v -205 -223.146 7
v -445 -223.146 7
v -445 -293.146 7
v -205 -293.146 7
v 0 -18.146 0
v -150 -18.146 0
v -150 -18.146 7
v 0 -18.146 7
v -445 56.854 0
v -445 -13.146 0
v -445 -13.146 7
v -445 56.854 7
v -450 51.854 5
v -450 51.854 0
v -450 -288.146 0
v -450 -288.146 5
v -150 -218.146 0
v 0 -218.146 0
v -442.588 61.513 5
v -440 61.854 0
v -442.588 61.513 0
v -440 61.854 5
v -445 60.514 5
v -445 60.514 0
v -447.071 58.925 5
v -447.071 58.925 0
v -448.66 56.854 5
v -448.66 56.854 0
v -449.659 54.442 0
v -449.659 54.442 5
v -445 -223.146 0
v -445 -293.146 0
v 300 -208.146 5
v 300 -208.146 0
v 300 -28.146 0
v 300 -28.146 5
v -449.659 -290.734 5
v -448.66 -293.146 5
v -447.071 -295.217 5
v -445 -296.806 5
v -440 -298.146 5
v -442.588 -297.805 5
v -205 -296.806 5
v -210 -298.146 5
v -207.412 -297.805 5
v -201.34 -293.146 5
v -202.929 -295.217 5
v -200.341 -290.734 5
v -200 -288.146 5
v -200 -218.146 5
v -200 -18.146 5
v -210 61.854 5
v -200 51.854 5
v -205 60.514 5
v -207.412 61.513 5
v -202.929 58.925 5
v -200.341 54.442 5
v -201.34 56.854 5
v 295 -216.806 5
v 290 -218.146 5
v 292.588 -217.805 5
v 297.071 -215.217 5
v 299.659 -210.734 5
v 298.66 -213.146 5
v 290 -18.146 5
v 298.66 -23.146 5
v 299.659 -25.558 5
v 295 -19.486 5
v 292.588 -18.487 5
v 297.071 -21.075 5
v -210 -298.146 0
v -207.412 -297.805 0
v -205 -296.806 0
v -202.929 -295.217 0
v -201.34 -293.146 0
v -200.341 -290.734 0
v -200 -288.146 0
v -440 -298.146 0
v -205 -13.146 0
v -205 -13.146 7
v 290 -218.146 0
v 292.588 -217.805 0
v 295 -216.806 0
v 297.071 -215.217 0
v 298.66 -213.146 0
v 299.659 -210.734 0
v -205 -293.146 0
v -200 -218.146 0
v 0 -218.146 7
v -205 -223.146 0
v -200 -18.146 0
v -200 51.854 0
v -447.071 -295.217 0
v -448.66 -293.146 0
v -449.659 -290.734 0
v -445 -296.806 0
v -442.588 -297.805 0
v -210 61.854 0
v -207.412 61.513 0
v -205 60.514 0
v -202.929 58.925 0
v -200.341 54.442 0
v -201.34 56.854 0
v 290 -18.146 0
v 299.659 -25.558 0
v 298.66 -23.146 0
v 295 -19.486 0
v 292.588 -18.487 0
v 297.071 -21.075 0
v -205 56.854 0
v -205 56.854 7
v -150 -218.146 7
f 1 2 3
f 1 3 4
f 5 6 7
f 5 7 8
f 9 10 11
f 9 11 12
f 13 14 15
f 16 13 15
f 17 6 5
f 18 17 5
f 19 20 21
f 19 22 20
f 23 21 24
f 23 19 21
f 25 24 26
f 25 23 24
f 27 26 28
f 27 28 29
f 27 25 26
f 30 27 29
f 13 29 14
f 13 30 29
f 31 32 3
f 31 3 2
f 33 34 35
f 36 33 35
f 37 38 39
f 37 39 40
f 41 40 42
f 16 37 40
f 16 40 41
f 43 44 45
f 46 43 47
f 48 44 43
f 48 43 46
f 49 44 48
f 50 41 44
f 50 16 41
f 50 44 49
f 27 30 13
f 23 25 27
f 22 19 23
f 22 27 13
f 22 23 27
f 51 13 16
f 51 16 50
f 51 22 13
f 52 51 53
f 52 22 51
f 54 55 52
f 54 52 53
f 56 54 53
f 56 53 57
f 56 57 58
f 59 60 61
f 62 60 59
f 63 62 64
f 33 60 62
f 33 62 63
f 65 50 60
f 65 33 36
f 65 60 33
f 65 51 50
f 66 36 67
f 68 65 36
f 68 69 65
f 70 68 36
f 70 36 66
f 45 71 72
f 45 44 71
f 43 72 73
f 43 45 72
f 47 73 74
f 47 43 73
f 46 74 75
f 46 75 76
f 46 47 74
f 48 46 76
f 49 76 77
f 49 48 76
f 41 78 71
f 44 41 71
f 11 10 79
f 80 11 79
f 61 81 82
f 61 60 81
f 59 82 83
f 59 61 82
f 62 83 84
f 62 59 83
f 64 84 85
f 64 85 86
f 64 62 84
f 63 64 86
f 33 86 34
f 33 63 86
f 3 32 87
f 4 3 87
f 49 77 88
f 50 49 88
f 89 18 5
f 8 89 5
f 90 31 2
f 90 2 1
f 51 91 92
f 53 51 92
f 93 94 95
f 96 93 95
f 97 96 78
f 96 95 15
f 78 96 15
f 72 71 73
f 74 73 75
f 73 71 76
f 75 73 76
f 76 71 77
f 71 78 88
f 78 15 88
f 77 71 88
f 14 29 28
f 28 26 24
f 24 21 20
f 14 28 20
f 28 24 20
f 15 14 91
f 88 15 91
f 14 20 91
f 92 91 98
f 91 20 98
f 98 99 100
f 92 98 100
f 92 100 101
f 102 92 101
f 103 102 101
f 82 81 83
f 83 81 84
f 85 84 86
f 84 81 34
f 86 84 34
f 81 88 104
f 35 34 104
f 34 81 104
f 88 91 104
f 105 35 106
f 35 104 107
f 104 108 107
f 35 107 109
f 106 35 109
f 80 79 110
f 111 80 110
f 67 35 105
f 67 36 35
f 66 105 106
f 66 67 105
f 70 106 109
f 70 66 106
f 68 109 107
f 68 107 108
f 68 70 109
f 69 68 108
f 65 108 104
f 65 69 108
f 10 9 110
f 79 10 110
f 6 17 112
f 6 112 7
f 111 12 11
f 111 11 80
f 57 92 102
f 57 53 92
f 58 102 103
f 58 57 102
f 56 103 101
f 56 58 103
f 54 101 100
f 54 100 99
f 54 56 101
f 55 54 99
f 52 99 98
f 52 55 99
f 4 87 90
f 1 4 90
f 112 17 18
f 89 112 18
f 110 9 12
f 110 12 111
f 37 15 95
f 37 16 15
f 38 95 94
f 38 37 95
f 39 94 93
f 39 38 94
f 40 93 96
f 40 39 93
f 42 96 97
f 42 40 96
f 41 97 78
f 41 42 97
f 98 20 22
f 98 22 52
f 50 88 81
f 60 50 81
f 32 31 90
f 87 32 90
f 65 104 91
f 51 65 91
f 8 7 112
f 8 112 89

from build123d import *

# Parameters (mm, degrees)
F0_W     = 300
F0_H     = 200
F0_W_2   = 150
F0_W_3   = 250
F0_H_2   = 80
F0_W_4   = 240
F0_H_3   = 70
F1_DEPTH = 5
F2_DEPTH = 7
F3_R     = 10


with BuildPart() as f1:
    # F0 (on Top) → F1 (new body)
    with BuildSketch(Plane.XY):
        Polygon((-200, -18.1460690498), (-450, -18.1460690498), (-450, -218.1460690498), (-200, -218.1460690498), (-150, -218.1460690498), (-150, -18.1460690498), align=None)
        with Locations((150, -118.1460690498)):
            Rectangle(F0_W, F0_H)
        with Locations((-75, -118.1460690498)):
            Rectangle(F0_W_2, F0_H)
        with Locations((-325, 21.8539309502)):
            Rectangle(F0_W_3, F0_H_2)
        with Locations((-325, 21.8539309502)):
            Rectangle(F0_W_4, F0_H_3, mode=Mode.SUBTRACT)
        with Locations((-325, -258.1460690498)):
            Rectangle(F0_W_3, F0_H_2)
        with Locations((-325, -258.1460690498)):
            Rectangle(F0_W_4, F0_H_3, mode=Mode.SUBTRACT)
        with Locations((-325, 21.8539309502)):
            Rectangle(F0_W_4, F0_H_3)
        with Locations((-325, -258.1460690498)):
            Rectangle(F0_W_4, F0_H_3)
    extrude(amount=F1_DEPTH)

    # F3
    f3_edges = [f1.edges().sort_by_distance(p)[0] for p in [
        (300, -218.146069, 2.5),
        (300, -18.146069, 2.5),
        (-200, -298.146069, 2.5),
        (-450, -298.146069, 2.5),
        (-450, 61.853931, 2.5),
        (-200, 61.853931, 2.5),
    ]]
    fillet(f3_edges, radius=F3_R)


with BuildPart() as f2:
    # F0 (on Top) → F2 (new body)
    with BuildSketch(Plane.XY):
        with Locations((-325, -258.1460690498)):
            Rectangle(F0_W_4, F0_H_3)
    extrude(amount=F2_DEPTH)


with BuildPart() as f2b:
    # F0 (on Top) → F2, piece 2 (new body)
    with BuildSketch(Plane.XY):
        with Locations((-325, 21.8539309502)):
            Rectangle(F0_W_4, F0_H_3)
    extrude(amount=F2_DEPTH)


with BuildPart() as f2c:
    # F0 (on Top) → F2, piece 3 (new body)
    with BuildSketch(Plane.XY):
        with Locations((-75, -118.1460690498)):
            Rectangle(F0_W_2, F0_H)
    extrude(amount=F2_DEPTH)


solid = Compound([f1.part, f2.part, f2b.part, f2c.part])
